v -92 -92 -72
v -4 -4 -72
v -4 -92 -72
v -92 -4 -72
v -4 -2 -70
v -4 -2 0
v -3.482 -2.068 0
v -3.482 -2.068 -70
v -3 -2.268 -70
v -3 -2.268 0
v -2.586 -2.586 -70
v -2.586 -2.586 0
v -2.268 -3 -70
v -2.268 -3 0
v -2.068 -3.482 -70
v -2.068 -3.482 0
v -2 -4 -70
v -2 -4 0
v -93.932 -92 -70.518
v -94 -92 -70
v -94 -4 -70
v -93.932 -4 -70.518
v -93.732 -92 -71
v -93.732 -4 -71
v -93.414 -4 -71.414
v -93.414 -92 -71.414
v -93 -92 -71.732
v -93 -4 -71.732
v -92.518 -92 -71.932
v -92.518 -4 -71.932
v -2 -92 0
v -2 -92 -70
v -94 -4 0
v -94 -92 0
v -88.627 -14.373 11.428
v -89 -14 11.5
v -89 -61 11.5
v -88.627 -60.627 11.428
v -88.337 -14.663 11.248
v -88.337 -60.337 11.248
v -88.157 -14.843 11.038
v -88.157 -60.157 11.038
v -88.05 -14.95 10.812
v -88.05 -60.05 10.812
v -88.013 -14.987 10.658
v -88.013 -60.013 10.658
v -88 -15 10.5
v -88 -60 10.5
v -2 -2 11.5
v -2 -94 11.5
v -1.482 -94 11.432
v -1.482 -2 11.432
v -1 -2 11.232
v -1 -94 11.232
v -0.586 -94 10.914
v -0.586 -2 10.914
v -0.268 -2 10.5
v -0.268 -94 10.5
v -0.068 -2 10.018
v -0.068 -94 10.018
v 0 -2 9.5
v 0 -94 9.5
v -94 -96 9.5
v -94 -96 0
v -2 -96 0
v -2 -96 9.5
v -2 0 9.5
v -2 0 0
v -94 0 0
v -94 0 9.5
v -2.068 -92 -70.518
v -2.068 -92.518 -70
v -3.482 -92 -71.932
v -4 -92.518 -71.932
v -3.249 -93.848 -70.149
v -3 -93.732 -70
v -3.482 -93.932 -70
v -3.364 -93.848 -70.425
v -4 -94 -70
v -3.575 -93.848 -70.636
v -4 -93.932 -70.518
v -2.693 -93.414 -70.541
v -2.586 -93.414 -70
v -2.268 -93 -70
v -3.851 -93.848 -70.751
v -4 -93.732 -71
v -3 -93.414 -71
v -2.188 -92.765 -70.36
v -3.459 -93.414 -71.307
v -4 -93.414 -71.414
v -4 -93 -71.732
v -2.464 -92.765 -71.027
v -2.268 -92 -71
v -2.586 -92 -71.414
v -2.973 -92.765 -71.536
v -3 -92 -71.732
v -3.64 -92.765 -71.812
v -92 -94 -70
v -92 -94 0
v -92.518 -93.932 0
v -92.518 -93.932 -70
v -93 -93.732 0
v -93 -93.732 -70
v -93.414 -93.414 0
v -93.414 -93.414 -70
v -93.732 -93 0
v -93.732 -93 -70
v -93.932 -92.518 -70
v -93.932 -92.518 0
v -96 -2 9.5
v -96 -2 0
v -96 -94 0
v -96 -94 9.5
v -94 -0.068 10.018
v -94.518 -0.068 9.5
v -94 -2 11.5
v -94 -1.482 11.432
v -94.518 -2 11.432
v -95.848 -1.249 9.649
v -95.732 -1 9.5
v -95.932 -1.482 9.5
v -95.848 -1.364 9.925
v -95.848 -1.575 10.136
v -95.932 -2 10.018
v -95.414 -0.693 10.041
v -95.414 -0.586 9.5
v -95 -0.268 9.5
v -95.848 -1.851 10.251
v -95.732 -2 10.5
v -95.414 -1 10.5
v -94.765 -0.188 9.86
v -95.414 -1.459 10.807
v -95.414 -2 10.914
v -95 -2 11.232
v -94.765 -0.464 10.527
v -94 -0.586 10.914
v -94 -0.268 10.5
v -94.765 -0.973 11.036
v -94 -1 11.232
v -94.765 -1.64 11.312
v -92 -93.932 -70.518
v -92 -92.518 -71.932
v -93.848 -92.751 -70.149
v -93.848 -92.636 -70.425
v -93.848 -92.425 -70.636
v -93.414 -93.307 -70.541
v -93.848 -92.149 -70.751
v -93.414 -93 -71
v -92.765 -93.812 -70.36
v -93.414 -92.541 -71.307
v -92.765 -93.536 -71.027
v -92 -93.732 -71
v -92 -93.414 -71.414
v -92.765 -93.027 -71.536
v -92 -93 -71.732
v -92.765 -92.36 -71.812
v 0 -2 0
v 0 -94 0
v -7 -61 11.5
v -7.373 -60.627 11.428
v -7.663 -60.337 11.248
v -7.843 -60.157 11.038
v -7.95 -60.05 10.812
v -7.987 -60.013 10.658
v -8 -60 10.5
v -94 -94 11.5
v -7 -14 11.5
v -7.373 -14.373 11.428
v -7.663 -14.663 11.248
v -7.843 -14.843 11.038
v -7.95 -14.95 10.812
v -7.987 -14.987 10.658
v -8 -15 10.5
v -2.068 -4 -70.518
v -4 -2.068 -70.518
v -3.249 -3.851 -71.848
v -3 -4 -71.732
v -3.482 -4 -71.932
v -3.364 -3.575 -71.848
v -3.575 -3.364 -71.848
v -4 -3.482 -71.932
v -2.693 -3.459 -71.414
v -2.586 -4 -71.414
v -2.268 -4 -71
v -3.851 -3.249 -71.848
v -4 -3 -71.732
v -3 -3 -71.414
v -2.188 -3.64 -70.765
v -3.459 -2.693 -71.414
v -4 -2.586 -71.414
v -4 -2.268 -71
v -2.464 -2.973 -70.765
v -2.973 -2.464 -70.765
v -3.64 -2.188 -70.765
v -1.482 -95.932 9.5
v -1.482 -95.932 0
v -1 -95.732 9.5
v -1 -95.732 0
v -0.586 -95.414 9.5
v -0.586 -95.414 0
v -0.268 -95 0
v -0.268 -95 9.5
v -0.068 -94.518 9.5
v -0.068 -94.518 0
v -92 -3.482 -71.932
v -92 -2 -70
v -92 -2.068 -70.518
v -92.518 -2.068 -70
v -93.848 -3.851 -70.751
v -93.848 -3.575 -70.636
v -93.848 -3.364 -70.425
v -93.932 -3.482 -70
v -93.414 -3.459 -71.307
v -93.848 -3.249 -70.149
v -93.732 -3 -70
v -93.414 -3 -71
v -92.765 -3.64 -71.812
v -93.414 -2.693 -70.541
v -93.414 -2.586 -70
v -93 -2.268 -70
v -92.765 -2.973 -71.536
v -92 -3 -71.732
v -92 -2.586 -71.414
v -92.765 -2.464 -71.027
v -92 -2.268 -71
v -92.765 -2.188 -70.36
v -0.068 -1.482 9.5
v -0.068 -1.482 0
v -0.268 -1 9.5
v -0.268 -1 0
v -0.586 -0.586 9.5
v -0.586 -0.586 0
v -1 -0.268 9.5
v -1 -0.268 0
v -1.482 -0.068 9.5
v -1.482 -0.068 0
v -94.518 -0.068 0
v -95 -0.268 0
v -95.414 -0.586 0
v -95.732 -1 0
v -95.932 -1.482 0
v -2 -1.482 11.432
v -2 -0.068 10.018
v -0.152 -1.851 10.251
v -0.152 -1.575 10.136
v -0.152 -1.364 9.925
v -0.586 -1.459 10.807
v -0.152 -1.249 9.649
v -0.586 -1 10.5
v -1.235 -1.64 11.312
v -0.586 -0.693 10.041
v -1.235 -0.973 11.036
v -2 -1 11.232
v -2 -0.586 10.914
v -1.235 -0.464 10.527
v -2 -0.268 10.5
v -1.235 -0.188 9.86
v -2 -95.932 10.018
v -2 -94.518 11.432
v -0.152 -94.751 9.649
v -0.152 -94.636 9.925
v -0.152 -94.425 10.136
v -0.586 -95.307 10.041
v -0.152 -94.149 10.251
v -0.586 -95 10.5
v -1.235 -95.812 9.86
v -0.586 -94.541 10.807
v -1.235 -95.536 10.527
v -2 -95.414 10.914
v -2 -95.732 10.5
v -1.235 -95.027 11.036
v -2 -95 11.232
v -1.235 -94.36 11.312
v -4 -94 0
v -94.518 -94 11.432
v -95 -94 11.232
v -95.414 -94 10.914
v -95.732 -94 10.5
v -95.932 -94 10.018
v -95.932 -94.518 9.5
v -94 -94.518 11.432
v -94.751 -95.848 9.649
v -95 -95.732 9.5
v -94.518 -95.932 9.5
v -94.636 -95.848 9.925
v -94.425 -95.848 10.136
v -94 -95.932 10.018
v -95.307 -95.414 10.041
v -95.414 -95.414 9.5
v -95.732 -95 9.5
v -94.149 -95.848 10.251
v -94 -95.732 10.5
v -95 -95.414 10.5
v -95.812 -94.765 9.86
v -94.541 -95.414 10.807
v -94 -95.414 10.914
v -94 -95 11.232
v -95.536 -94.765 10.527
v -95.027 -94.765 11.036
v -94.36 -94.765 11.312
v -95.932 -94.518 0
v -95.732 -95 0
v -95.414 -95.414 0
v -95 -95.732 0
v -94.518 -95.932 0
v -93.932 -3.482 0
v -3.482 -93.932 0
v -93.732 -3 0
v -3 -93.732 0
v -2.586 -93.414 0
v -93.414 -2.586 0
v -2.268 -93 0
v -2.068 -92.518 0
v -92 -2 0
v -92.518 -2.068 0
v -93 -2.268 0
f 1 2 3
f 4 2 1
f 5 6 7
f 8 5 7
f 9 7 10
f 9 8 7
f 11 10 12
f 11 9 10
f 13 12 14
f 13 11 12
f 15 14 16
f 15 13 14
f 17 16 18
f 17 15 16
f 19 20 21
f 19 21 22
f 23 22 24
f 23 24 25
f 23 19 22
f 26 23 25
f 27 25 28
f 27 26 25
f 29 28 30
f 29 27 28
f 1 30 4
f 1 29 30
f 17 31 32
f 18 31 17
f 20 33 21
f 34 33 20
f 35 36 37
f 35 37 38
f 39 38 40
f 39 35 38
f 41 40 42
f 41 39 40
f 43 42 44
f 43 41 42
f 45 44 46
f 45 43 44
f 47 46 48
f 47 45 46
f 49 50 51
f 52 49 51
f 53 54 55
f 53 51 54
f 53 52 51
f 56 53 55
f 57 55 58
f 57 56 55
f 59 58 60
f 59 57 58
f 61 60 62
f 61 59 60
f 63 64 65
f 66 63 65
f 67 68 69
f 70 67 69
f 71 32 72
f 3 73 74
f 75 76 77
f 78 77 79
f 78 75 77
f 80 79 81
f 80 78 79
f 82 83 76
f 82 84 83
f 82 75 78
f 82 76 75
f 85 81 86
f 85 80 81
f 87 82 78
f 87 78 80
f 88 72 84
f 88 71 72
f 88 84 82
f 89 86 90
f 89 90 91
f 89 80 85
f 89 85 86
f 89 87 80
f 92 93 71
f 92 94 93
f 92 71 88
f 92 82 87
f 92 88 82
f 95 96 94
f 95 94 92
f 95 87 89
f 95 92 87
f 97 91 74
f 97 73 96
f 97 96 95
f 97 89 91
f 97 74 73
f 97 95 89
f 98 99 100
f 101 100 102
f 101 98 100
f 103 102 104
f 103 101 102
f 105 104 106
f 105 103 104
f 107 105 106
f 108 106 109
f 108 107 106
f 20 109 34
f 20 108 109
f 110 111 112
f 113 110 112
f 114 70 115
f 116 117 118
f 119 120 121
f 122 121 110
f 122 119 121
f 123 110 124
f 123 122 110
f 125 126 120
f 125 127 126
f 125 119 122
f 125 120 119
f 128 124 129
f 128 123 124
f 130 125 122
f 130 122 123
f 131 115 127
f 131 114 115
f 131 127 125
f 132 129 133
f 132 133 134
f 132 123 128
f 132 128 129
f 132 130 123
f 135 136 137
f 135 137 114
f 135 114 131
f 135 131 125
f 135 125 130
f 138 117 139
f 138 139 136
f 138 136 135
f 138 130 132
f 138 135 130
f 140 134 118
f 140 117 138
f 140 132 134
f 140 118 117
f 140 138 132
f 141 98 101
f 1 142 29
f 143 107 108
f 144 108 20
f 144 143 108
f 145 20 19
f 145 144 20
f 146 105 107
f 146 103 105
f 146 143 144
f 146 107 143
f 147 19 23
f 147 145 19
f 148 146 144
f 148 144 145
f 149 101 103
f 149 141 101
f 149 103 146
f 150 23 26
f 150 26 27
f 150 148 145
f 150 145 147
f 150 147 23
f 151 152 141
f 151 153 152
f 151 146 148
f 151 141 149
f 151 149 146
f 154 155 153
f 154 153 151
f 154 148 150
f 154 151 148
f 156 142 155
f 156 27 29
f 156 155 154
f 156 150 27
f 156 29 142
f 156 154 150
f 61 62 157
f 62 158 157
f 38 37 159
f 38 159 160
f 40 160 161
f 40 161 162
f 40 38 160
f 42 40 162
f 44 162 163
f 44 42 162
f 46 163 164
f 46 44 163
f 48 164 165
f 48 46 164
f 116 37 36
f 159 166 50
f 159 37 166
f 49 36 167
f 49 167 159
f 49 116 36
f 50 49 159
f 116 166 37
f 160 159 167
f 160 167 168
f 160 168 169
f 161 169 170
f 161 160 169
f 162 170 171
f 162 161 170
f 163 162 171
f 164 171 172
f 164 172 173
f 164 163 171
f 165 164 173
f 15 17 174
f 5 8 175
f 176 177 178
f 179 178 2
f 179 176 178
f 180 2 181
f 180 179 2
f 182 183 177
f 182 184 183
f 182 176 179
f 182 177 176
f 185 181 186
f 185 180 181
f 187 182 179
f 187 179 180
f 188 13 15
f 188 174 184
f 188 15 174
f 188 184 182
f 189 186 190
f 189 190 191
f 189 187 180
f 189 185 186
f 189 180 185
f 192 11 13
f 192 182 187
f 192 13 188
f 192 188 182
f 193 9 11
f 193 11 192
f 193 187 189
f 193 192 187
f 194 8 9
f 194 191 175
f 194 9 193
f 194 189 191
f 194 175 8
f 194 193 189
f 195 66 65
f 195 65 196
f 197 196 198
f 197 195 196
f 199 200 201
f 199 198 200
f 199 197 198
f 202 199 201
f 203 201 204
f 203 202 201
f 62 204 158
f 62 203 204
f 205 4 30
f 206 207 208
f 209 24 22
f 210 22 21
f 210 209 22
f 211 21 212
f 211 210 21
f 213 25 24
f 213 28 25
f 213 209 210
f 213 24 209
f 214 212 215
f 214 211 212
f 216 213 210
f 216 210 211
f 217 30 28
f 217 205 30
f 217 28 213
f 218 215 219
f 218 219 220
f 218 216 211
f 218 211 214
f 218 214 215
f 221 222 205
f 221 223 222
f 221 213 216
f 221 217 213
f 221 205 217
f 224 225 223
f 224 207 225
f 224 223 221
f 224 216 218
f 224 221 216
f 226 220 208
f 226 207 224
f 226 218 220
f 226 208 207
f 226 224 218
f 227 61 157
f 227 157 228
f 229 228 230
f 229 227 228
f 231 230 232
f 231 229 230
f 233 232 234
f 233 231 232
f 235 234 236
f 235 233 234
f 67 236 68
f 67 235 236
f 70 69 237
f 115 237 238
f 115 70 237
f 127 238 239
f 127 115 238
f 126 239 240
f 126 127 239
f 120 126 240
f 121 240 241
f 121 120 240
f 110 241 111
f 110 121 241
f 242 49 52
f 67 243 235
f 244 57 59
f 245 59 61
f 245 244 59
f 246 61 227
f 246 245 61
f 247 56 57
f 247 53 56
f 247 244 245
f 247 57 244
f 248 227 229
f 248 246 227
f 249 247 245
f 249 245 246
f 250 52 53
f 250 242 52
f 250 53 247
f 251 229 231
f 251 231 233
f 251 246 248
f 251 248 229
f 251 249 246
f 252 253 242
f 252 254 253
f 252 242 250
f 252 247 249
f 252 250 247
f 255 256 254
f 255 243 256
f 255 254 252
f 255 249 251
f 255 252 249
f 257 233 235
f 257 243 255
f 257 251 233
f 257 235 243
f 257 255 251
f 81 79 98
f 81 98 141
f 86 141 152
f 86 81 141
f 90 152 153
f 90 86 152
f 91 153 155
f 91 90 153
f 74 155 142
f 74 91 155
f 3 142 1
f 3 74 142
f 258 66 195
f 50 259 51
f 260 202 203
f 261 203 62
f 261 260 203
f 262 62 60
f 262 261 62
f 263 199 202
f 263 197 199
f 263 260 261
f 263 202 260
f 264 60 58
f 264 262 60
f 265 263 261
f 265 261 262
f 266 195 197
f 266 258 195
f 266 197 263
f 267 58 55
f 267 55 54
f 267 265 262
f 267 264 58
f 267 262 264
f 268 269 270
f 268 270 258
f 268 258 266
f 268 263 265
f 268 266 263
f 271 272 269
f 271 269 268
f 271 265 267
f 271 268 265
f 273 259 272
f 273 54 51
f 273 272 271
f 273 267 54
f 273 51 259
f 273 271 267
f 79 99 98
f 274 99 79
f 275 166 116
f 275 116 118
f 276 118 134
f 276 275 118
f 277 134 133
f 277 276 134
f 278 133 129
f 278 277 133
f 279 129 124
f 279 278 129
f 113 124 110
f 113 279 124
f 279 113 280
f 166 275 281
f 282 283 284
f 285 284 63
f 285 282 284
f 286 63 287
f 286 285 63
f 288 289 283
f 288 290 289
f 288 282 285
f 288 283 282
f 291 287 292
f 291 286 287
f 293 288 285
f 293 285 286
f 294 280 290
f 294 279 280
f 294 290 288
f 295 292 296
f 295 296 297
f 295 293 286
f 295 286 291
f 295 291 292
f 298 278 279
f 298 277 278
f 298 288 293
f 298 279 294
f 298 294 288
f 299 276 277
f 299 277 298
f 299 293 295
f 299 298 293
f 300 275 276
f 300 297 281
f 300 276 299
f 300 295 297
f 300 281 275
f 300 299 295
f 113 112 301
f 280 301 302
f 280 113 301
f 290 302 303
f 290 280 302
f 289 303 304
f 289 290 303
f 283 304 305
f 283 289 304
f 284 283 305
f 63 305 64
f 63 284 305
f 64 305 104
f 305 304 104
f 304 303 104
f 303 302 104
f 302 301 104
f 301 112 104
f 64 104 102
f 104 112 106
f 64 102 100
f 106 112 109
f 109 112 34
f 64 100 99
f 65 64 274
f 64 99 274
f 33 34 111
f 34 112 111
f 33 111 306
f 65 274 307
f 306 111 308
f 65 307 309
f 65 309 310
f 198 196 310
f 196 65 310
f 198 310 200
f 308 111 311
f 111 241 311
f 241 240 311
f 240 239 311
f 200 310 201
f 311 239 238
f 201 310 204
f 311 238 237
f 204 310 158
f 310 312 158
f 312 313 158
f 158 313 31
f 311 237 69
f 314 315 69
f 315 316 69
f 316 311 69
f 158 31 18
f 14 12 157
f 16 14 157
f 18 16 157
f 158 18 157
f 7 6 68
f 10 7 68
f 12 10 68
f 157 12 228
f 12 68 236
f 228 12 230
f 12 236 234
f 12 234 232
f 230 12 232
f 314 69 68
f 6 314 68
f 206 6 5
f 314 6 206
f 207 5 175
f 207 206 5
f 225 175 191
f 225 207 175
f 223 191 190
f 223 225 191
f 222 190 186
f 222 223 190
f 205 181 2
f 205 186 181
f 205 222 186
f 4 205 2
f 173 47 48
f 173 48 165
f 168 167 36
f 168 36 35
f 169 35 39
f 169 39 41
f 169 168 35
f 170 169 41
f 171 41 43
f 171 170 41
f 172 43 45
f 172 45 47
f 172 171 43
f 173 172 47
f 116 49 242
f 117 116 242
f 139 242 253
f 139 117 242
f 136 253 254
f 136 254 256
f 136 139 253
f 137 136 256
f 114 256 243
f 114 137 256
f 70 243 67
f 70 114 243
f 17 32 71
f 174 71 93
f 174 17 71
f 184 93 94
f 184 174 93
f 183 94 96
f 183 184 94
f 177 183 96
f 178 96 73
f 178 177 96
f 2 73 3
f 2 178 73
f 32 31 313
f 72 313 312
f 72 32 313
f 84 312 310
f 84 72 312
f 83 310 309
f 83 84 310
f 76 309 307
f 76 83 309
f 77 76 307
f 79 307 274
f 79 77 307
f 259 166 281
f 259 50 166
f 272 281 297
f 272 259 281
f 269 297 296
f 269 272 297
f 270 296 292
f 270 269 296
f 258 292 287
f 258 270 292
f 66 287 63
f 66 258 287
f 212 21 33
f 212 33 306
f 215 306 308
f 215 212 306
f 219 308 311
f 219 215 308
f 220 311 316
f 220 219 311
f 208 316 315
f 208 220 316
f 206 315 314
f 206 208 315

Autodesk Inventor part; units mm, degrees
ref_plane "YZ Plane" through (0, 0, 0) normal (1, 0, 0) x (0, 1, 0)
ref_plane "XZ Plane" through (0, 0, 0) normal (0, 1, 0) x (-1, 0, 0)
ref_plane "XY Plane" through (0, 0, 0) normal (0, 0, 1) x (1, 0, 0)
sketch "Эскиз1" plane through (0, 0, 0) normal (0, 0, 1) x (1, 0, 0)
  line L0 (0, 0) -> (-96, 0)
  line L1 (-96, 0) -> (-96, -96)
  line L2 (-96, -96) -> (0, -96)
  line L3 (0, -96) -> (0, 0)
  dimension "d0" = 96
  dimension "d1" = 96
extrude "Выдавливание1" add sketch "Эскиз1" along normal blind 11.5
fillet "Сопряжение1" radius 2 8 edges at (-48, 0, 11.5) (-96, -48, 11.5) (-96, 0, 5.75) (-96, -96, 5.75) (-48, -96, 11.5) (0, -48, 11.5) (0, -96, 5.75) (0, 0, 5.75)
sketch "Эскиз2" plane through (0, 0, 0) normal (0, 0, -1) x (-1, 0, 0)
  line L0 (2, -2) -> (94, -2)
  line L1 (94, -2) -> (94, -94)
  line L2 (94, -94) -> (2, -94)
  line L3 (2, -94) -> (2, -2)
  line L4 (18.852, -2) -> (35.4089, -2)
  line L5 (0, -94) -> (0, -2) projected
  line L6 (2, 0) -> (94, 0) projected
  point P0 (0, 0)
  dimension "d5" = 92
  dimension "d6" = 92
  dimension "d7" = 2
  dimension "d8" = 2
extrude "Выдавливание2" add sketch "Эскиз2" along normal blind 72
fillet "Сопряжение2" radius 2 8 edges at (-2, -2, -36) (-48, -2, -72) (-2, -48, -72) (-2, -94, -36) (-48, -94, -72) (-94, -94, -36) (-94, -48, -72) (-94, -2, -36)
sketch "Эскиз4" plane through (0, 0, 11.5) normal (0, 0, 1) x (1, 0, 0)
  line L0 (-88, -15) -> (-8, -15)
  line L1 (-8, -15) -> (-8, -60)
  line L2 (-8, -60) -> (-88, -60)
  line L3 (-88, -60) -> (-88, -15)
  line L4 (0, -94) -> (0, -2) projected
  line L5 (-2, 0) -> (-94, 0) projected
  point P0 (0, 0)
  dimension "d15" = 45
  dimension "d16" = 80
  dimension "d17" = 8
  dimension "d21" = 15
extrude "Выдавливание4" cut sketch "Эскиз4" against normal blind 1
fillet "Сопряжение3" radius 1 4 edges at (-8, -37.5, 11.5) (-48, -60, 11.5) (-48, -15, 11.5) (-88, -37.5, 11.5)
properties part number "EM20"
